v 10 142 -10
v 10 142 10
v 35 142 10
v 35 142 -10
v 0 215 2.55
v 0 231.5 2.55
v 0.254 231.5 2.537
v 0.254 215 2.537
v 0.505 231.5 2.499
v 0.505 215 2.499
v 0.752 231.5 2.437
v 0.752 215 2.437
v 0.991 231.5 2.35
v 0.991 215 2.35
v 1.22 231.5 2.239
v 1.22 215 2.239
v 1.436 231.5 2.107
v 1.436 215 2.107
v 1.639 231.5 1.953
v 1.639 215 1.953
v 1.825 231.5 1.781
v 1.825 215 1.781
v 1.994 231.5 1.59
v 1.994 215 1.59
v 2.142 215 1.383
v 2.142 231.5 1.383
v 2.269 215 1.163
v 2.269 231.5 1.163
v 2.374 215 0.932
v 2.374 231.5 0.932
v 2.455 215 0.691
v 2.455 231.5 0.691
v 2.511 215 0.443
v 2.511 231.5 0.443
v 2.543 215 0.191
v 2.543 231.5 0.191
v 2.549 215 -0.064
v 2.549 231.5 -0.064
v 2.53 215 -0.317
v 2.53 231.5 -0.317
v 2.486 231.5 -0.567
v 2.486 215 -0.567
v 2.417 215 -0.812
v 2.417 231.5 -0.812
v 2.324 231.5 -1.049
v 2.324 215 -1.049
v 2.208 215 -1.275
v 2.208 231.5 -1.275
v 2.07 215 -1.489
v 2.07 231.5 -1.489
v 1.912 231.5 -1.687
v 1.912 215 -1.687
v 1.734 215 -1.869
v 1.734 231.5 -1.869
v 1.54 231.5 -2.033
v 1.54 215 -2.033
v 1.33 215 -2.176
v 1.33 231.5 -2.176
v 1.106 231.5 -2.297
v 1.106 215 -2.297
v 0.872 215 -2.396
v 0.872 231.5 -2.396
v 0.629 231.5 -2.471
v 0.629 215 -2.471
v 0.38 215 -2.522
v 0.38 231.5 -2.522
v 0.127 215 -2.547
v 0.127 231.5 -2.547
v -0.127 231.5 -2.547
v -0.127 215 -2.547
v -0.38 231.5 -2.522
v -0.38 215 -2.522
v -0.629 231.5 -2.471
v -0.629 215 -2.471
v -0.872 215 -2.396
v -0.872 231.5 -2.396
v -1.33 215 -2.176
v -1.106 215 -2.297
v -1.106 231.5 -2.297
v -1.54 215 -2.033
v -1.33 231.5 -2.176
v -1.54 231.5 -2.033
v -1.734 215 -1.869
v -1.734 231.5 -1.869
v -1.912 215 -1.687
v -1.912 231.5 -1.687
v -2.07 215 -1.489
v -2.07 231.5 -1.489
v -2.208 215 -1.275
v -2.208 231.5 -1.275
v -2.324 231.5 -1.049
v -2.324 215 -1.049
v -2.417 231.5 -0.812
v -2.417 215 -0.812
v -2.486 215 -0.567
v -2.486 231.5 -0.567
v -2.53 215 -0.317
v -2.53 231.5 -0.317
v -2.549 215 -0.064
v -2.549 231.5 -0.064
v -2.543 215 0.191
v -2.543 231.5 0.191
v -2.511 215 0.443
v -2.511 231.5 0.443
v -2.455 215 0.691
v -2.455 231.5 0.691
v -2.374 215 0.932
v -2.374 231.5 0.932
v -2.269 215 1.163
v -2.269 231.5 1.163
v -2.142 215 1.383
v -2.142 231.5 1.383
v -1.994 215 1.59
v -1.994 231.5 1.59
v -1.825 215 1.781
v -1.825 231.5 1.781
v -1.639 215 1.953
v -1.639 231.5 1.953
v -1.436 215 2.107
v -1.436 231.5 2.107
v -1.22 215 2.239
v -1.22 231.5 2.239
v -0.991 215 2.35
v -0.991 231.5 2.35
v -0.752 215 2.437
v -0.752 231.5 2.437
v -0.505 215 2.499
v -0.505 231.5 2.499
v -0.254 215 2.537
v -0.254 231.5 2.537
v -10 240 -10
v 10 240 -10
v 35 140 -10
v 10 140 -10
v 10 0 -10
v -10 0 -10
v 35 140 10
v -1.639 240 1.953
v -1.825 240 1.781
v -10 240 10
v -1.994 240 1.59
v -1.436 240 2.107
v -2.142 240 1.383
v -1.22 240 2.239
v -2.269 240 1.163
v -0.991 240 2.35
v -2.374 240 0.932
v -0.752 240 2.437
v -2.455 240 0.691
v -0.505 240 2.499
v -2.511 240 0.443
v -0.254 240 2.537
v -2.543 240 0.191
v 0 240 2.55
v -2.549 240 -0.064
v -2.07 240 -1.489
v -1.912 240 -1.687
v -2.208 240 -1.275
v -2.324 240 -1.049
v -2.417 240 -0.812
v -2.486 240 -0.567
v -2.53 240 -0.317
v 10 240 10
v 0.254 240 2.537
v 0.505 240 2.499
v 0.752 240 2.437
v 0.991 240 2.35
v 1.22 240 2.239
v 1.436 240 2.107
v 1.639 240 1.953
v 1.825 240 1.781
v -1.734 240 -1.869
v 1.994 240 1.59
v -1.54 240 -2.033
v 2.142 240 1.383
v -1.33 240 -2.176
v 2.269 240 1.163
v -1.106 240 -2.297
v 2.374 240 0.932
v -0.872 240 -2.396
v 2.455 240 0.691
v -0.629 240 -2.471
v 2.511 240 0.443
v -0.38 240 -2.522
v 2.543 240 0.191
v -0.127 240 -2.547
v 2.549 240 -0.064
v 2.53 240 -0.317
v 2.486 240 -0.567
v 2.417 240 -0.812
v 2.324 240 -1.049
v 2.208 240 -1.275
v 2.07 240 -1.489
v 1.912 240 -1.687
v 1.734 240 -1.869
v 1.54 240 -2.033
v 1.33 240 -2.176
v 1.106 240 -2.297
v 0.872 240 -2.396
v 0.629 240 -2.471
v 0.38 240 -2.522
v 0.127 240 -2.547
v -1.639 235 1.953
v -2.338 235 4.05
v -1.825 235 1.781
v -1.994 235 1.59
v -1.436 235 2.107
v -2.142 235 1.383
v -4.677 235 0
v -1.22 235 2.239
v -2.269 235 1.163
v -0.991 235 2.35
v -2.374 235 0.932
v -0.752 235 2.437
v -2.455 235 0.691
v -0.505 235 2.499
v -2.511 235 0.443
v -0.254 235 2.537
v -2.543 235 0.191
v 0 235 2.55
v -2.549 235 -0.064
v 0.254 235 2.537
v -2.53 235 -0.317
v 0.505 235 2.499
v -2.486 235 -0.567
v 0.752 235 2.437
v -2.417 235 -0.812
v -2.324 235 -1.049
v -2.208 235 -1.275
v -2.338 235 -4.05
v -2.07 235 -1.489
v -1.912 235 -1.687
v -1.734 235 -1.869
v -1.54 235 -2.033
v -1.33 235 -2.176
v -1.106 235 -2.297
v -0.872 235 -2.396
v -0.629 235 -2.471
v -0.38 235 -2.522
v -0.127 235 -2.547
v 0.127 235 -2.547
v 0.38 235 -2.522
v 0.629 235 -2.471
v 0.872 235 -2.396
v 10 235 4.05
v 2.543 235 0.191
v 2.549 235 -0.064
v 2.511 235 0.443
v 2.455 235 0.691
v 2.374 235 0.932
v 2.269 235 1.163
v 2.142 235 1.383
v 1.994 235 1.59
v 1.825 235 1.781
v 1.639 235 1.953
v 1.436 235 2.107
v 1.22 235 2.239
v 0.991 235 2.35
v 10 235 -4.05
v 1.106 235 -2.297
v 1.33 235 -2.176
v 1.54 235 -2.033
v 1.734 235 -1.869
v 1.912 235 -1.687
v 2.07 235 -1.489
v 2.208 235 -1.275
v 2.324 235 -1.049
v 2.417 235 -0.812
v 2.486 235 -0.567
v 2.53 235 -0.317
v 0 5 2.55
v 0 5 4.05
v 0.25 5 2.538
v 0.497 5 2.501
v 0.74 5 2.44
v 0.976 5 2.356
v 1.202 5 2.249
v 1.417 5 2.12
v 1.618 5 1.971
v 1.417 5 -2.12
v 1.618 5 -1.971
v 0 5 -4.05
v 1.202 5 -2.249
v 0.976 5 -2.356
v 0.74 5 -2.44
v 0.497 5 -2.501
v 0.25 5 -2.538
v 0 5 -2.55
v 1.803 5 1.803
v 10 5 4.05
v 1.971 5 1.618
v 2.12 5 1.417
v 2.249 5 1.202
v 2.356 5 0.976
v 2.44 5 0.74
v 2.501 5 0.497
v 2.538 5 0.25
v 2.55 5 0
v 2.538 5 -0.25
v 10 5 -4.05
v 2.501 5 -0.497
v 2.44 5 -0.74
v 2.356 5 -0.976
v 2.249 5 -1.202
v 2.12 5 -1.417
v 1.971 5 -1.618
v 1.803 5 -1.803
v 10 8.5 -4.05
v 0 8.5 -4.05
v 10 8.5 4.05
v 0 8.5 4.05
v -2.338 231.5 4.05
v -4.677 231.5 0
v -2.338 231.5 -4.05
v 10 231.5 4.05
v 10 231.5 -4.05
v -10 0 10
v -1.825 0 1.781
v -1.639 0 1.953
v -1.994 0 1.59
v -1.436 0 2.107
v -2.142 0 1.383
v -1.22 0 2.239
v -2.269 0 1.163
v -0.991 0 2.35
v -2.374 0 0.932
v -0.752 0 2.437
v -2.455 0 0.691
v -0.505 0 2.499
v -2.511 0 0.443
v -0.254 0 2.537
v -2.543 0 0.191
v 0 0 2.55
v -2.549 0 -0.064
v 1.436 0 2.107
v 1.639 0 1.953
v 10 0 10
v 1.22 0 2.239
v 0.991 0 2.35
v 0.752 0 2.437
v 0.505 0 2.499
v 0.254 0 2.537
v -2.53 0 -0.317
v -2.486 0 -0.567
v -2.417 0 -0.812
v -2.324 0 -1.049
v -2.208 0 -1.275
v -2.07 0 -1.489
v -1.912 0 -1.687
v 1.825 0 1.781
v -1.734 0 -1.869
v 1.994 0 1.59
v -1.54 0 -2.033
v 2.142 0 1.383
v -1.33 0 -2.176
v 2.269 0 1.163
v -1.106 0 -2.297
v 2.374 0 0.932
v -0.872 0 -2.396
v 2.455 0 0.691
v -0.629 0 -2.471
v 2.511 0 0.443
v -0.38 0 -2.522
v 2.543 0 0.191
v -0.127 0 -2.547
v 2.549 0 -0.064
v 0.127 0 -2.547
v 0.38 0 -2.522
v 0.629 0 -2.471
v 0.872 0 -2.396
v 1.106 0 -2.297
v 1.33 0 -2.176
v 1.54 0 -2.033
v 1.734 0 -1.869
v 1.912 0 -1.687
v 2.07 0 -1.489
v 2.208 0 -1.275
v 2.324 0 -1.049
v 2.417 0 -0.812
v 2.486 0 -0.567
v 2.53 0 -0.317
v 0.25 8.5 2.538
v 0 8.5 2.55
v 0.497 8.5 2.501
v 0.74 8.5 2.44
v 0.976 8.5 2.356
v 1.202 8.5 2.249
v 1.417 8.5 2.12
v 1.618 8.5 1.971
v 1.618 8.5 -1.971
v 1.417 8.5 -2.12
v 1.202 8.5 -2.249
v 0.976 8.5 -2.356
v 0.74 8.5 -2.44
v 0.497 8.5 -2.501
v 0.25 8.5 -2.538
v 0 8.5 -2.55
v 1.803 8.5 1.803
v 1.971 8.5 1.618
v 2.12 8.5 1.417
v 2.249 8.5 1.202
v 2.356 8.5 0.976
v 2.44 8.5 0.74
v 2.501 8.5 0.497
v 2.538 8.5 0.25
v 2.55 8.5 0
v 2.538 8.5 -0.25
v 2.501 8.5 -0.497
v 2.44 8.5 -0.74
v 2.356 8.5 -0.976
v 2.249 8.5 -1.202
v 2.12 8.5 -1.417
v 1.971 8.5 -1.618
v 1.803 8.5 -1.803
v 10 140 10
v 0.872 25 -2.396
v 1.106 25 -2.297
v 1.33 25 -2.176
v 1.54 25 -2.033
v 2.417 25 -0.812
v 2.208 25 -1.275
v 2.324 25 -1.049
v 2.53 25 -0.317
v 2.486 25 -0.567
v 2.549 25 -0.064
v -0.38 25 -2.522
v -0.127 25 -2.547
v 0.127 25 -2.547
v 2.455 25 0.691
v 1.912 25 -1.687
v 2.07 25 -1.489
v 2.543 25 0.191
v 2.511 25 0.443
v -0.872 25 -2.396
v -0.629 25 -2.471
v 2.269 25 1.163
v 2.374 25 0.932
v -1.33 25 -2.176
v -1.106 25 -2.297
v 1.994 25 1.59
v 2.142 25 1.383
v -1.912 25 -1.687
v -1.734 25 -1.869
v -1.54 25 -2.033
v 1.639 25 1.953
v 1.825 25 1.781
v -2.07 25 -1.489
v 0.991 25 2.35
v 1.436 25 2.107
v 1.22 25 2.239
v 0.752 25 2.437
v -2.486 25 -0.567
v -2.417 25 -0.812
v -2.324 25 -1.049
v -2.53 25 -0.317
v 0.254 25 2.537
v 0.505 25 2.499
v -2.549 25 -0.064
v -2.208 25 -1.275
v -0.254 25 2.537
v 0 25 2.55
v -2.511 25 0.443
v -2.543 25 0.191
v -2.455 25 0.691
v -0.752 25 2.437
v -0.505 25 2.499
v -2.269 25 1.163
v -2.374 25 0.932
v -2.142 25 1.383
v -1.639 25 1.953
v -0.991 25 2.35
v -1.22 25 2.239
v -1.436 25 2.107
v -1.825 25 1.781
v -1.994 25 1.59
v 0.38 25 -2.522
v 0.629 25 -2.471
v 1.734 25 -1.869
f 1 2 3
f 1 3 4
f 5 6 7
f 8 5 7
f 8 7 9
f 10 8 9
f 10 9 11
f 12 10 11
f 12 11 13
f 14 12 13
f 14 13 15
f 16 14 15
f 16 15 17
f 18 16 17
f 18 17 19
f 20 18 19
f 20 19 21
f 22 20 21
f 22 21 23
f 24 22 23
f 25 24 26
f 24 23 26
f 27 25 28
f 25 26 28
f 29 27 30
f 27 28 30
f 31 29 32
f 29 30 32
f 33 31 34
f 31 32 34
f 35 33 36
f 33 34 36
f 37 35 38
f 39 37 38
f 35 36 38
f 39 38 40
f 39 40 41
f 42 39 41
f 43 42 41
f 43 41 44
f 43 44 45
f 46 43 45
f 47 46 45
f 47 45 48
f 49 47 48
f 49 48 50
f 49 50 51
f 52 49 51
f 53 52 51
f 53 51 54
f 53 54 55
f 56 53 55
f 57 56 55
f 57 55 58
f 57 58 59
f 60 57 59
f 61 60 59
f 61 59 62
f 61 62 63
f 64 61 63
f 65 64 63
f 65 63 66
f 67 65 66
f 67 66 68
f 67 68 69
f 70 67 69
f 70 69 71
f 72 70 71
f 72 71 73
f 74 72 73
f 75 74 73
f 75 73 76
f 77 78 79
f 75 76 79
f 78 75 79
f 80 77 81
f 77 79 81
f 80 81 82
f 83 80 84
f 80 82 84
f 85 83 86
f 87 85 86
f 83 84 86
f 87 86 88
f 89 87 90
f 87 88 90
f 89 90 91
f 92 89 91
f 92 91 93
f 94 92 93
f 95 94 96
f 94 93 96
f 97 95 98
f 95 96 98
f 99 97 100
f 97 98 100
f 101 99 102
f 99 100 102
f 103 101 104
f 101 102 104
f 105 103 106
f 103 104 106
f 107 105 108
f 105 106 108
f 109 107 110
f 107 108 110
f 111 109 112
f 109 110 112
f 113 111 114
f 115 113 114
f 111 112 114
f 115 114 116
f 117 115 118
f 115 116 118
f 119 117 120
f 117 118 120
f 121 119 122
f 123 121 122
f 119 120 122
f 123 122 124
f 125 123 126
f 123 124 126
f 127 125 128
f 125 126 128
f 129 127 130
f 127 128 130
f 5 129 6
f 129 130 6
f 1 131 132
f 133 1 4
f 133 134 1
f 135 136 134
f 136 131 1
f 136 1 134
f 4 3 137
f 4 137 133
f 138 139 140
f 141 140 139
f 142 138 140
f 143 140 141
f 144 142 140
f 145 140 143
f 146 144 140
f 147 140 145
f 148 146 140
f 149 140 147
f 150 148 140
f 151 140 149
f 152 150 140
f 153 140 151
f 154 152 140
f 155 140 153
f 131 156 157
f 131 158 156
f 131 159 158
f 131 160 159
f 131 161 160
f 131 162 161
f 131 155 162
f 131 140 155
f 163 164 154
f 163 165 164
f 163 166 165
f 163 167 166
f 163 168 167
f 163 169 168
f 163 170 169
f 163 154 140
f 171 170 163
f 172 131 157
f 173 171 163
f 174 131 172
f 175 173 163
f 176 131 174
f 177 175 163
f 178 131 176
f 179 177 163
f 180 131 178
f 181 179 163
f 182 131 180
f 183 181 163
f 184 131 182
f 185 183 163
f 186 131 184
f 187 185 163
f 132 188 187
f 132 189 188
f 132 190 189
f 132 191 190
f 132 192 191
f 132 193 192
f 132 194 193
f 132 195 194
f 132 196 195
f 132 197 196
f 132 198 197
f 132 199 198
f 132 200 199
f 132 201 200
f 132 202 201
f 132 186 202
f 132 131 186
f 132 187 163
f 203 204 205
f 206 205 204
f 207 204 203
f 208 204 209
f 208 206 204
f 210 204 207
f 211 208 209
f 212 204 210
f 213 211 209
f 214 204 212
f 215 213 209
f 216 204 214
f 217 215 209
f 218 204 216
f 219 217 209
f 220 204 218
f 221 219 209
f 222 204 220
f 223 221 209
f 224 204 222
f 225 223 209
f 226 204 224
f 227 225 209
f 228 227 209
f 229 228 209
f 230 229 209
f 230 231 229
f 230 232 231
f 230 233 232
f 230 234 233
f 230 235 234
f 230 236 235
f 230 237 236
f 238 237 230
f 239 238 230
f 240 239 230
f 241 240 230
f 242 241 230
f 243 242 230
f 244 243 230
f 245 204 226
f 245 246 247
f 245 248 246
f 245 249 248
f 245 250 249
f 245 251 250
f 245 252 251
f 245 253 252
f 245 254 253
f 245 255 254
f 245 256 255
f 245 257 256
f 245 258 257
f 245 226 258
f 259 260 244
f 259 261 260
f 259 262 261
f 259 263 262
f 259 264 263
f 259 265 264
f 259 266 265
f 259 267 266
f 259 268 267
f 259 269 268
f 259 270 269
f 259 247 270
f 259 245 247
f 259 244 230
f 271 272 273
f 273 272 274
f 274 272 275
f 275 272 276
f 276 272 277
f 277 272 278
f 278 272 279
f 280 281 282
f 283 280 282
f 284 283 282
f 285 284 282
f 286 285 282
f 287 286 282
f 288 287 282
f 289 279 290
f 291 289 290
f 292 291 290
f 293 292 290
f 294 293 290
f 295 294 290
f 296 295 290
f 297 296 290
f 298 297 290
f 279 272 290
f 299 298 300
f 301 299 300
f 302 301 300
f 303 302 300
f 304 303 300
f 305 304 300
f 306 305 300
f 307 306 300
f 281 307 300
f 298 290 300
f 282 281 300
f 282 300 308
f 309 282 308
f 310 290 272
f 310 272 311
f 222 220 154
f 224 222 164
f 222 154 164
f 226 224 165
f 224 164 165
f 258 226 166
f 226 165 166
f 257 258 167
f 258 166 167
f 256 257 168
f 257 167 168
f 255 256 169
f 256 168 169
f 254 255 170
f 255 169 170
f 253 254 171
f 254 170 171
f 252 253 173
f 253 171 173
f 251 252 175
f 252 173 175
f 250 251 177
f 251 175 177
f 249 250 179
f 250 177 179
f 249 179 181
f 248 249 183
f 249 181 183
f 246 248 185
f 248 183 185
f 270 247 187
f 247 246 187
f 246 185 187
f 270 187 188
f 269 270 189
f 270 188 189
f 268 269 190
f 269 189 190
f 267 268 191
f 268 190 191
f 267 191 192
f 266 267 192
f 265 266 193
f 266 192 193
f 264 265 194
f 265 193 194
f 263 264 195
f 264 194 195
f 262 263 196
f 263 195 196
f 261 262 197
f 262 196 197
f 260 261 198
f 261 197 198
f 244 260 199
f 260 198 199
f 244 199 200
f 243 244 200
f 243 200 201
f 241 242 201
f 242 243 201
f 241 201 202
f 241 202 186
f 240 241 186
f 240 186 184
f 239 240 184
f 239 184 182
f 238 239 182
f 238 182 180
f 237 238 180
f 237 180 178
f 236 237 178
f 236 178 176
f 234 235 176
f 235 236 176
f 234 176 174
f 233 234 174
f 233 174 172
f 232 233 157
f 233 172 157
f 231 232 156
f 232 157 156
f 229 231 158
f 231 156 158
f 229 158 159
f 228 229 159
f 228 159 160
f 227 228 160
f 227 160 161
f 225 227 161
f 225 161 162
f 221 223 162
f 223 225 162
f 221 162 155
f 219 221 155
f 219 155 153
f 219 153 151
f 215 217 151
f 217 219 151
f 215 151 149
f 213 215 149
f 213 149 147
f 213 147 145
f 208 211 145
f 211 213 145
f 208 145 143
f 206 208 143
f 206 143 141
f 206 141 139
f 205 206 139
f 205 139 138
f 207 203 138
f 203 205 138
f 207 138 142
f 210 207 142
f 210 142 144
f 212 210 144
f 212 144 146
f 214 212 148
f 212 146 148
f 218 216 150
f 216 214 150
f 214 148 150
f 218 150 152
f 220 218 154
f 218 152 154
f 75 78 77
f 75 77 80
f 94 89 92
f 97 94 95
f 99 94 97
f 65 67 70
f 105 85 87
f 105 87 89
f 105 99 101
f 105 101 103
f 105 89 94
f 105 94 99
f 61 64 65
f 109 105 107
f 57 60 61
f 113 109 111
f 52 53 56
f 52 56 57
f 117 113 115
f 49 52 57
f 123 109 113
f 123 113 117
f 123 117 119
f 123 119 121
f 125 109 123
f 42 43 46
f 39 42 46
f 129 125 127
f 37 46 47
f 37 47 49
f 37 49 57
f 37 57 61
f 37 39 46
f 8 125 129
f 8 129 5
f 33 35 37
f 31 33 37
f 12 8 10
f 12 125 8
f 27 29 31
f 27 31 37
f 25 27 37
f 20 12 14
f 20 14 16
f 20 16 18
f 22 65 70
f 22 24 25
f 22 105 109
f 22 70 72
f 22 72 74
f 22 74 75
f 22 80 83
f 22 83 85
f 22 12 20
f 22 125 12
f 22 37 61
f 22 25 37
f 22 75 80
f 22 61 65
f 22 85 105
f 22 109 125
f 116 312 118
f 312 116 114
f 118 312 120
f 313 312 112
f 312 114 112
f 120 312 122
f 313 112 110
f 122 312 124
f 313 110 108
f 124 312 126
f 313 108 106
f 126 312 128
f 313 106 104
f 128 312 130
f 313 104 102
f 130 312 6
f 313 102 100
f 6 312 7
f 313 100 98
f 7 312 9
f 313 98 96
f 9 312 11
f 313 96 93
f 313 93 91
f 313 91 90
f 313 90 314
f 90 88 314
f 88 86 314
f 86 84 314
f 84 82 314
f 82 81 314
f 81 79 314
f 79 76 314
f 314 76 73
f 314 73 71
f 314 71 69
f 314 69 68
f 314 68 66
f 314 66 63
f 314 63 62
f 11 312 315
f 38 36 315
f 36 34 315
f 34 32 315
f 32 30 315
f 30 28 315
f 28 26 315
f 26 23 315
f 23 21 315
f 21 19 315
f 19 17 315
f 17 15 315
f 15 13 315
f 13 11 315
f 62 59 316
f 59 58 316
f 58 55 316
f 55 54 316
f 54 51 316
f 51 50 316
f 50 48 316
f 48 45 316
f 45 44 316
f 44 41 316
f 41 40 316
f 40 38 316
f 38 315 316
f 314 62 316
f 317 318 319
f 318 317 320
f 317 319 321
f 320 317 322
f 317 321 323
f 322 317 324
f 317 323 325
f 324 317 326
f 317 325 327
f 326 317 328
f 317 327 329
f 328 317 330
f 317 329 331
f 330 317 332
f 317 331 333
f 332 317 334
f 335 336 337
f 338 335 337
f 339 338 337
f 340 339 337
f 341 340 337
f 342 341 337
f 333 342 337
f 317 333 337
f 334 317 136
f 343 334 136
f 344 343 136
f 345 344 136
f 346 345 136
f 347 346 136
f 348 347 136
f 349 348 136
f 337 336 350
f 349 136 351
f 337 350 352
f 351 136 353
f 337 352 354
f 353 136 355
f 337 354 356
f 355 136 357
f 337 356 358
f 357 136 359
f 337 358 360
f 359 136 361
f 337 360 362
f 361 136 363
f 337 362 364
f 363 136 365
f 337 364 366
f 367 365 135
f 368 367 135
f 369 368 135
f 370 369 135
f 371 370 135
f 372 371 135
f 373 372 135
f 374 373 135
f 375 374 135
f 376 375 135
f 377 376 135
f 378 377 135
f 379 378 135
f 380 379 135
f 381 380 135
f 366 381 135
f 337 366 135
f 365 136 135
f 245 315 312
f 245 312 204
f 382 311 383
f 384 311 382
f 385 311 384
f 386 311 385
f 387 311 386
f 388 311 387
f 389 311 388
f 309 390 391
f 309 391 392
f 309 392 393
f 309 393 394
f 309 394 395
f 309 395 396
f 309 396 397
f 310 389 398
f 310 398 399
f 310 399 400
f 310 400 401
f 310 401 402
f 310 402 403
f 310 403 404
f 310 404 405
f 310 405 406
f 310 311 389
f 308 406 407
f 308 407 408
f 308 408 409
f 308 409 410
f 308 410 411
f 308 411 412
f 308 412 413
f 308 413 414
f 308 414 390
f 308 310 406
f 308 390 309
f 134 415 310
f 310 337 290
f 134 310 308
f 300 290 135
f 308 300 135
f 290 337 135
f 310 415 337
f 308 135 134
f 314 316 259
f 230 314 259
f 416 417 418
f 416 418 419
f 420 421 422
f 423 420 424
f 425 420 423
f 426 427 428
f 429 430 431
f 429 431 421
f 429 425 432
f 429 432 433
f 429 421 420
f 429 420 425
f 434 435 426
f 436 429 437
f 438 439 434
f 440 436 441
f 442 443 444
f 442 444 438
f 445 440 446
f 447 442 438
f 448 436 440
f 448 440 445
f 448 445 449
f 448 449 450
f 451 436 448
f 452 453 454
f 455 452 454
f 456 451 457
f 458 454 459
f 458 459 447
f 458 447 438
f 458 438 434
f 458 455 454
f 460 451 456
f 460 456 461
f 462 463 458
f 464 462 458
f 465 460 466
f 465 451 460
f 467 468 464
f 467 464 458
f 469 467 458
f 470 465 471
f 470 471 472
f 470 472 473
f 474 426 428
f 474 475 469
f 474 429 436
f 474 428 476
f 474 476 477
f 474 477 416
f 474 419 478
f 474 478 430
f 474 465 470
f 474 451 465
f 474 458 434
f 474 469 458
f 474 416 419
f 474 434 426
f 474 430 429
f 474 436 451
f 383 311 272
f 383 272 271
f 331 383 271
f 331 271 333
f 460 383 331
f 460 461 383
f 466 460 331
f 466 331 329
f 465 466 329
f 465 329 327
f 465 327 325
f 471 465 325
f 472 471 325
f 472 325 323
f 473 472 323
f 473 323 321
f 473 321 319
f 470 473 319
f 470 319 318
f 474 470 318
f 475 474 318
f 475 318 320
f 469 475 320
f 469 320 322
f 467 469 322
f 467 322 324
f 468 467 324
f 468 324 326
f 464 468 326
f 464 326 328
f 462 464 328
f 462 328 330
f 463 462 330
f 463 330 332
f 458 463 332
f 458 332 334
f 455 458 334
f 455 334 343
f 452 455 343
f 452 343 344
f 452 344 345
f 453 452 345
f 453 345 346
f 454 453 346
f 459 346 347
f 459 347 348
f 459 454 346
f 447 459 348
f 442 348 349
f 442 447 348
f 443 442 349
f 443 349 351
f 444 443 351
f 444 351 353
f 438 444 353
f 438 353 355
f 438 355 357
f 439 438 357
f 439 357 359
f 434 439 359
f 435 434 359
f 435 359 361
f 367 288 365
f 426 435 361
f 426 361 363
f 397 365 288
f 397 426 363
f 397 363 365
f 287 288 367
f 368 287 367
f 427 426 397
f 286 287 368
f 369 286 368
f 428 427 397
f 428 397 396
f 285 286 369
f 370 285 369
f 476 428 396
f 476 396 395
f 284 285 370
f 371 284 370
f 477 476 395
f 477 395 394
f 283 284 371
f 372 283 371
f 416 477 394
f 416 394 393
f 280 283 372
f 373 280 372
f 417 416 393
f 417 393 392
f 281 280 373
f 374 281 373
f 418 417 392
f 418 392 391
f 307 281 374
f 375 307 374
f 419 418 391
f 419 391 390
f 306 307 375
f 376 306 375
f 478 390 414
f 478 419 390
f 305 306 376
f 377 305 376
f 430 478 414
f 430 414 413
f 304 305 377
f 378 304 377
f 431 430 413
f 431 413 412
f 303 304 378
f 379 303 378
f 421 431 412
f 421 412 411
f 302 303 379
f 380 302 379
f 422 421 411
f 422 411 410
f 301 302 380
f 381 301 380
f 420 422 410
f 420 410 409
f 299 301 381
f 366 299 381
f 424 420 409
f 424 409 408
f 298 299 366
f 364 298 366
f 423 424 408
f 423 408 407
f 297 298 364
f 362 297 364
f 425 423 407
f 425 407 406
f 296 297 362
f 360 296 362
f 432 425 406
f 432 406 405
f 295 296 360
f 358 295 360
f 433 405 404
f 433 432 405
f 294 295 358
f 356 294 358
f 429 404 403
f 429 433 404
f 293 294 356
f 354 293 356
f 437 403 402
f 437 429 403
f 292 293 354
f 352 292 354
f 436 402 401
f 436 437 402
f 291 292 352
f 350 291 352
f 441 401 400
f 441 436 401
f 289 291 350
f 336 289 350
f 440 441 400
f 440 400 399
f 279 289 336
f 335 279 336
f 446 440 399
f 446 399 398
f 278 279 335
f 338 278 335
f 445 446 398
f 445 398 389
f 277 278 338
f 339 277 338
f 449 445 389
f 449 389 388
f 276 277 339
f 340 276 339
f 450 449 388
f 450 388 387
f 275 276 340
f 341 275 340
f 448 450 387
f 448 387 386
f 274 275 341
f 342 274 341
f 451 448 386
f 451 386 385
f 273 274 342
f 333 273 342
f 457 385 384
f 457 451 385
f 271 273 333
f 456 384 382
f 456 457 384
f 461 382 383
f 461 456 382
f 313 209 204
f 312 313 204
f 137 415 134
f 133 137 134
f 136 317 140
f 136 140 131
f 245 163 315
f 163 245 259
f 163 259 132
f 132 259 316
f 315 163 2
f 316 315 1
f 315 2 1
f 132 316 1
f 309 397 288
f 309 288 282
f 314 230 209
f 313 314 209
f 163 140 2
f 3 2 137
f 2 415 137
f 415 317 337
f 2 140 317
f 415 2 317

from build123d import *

# Parameters (mm, degrees)
ESQUISSE1_W             = 20
ESQUISSE1_H             = 20
BOSS_EXTRU_2_DEPTH      = 240
ESQUISSE5_W             = 8.1
ESQUISSE5_H             = 3.5
ENL_V_MAT_EXTRU_2_DEPTH = 10
ESQUISSE6_R             = 2.55
ENL_V_MAT_EXTRU_3_DEPTH = 25
ENL_V_START             = 3.5
ENL_V_MAT_EXTRU_5_DEPTH = 3.5
ENL_V_START_2           = -25
ESQUISSE9_R             = 2.55
ENL_V_MAT_EXTRU_6_DEPTH = 25
ESQUISSE10_W            = 20
ESQUISSE10_H            = 2
BOSS_EXTRU_5_DEPTH      = 25


with BuildPart() as part:
    # Esquisse1 → Boss.-Extru.2 (new body)
    with BuildSketch(Plane(origin=(0, 0, 0), x_dir=(1, 0, 0), z_dir=(0, 1, 0))):
        Rectangle(ESQUISSE1_W, ESQUISSE1_H)
    extrude(amount=BOSS_EXTRU_2_DEPTH)

    # Esquisse5 → Enlèv. mat.-Extru.2 (cut)
    with BuildSketch(Plane(origin=(10, 0, 0), x_dir=(0, 0, -1), z_dir=(1, 0, 0))):
        with Locations((0, 233.25)):
            Rectangle(ESQUISSE5_W, ESQUISSE5_H)
        with Locations((0, 6.75)):
            Rectangle(ESQUISSE5_W, ESQUISSE5_H)
    extrude(amount=-ENL_V_MAT_EXTRU_2_DEPTH, mode=Mode.SUBTRACT)

    # Esquisse6 → Enlèv. mat.-Extru.3 (cut)
    with BuildSketch(Plane(origin=(0, 240, 0), x_dir=(1, 0, 0), z_dir=(0, 1, 0))):
        with Locations(Location((0, 0, 0), (0, 0, 270))):
            Circle(ESQUISSE6_R)
    extrude(amount=-ENL_V_MAT_EXTRU_3_DEPTH, mode=Mode.SUBTRACT)

    # Esquisse7 → Enlèv. mat.-Extru.5 (cut)
    with BuildSketch(Plane(origin=(0, 231.5, 0), x_dir=(1, 0, 0), z_dir=(0, 1, 0)).offset(ENL_V_START)):
        with BuildLine():
            Line((-2.33826859, -4.05), (0, -4.05))
            Line((0, -4.05), (0, -2.55))
            ThreePointArc((0, -2.55), (-2.55, 0), (0, 2.55))
            Line((0, 2.55), (0, 4.05))
            Line((0, 4.05), (-2.33826859, 4.05))
            Line((-2.33826859, 4.05), (-4.67653718, 0))
            Line((-4.67653718, 0), (-2.33826859, -4.05))
        make_face()
    extrude(amount=-ENL_V_MAT_EXTRU_5_DEPTH, mode=Mode.SUBTRACT)

    # Esquisse9 → Enlèv. mat.-Extru.6 (cut)
    with BuildSketch(Plane.XZ.offset(ENL_V_START_2)):
        with Locations(Location((0, 0, 0), (0, 0, 90))):
            Circle(ESQUISSE9_R)
    extrude(amount=ENL_V_MAT_EXTRU_6_DEPTH, mode=Mode.SUBTRACT)

    # Esquisse10 → Boss.-Extru.5 (add)
    with BuildSketch(Plane(origin=(10, 0, 0), x_dir=(0, 0, -1), z_dir=(1, 0, 0))):
        with Locations((0, 141)):
            Rectangle(ESQUISSE10_W, ESQUISSE10_H)
    extrude(amount=BOSS_EXTRU_5_DEPTH)


solid = part.part
